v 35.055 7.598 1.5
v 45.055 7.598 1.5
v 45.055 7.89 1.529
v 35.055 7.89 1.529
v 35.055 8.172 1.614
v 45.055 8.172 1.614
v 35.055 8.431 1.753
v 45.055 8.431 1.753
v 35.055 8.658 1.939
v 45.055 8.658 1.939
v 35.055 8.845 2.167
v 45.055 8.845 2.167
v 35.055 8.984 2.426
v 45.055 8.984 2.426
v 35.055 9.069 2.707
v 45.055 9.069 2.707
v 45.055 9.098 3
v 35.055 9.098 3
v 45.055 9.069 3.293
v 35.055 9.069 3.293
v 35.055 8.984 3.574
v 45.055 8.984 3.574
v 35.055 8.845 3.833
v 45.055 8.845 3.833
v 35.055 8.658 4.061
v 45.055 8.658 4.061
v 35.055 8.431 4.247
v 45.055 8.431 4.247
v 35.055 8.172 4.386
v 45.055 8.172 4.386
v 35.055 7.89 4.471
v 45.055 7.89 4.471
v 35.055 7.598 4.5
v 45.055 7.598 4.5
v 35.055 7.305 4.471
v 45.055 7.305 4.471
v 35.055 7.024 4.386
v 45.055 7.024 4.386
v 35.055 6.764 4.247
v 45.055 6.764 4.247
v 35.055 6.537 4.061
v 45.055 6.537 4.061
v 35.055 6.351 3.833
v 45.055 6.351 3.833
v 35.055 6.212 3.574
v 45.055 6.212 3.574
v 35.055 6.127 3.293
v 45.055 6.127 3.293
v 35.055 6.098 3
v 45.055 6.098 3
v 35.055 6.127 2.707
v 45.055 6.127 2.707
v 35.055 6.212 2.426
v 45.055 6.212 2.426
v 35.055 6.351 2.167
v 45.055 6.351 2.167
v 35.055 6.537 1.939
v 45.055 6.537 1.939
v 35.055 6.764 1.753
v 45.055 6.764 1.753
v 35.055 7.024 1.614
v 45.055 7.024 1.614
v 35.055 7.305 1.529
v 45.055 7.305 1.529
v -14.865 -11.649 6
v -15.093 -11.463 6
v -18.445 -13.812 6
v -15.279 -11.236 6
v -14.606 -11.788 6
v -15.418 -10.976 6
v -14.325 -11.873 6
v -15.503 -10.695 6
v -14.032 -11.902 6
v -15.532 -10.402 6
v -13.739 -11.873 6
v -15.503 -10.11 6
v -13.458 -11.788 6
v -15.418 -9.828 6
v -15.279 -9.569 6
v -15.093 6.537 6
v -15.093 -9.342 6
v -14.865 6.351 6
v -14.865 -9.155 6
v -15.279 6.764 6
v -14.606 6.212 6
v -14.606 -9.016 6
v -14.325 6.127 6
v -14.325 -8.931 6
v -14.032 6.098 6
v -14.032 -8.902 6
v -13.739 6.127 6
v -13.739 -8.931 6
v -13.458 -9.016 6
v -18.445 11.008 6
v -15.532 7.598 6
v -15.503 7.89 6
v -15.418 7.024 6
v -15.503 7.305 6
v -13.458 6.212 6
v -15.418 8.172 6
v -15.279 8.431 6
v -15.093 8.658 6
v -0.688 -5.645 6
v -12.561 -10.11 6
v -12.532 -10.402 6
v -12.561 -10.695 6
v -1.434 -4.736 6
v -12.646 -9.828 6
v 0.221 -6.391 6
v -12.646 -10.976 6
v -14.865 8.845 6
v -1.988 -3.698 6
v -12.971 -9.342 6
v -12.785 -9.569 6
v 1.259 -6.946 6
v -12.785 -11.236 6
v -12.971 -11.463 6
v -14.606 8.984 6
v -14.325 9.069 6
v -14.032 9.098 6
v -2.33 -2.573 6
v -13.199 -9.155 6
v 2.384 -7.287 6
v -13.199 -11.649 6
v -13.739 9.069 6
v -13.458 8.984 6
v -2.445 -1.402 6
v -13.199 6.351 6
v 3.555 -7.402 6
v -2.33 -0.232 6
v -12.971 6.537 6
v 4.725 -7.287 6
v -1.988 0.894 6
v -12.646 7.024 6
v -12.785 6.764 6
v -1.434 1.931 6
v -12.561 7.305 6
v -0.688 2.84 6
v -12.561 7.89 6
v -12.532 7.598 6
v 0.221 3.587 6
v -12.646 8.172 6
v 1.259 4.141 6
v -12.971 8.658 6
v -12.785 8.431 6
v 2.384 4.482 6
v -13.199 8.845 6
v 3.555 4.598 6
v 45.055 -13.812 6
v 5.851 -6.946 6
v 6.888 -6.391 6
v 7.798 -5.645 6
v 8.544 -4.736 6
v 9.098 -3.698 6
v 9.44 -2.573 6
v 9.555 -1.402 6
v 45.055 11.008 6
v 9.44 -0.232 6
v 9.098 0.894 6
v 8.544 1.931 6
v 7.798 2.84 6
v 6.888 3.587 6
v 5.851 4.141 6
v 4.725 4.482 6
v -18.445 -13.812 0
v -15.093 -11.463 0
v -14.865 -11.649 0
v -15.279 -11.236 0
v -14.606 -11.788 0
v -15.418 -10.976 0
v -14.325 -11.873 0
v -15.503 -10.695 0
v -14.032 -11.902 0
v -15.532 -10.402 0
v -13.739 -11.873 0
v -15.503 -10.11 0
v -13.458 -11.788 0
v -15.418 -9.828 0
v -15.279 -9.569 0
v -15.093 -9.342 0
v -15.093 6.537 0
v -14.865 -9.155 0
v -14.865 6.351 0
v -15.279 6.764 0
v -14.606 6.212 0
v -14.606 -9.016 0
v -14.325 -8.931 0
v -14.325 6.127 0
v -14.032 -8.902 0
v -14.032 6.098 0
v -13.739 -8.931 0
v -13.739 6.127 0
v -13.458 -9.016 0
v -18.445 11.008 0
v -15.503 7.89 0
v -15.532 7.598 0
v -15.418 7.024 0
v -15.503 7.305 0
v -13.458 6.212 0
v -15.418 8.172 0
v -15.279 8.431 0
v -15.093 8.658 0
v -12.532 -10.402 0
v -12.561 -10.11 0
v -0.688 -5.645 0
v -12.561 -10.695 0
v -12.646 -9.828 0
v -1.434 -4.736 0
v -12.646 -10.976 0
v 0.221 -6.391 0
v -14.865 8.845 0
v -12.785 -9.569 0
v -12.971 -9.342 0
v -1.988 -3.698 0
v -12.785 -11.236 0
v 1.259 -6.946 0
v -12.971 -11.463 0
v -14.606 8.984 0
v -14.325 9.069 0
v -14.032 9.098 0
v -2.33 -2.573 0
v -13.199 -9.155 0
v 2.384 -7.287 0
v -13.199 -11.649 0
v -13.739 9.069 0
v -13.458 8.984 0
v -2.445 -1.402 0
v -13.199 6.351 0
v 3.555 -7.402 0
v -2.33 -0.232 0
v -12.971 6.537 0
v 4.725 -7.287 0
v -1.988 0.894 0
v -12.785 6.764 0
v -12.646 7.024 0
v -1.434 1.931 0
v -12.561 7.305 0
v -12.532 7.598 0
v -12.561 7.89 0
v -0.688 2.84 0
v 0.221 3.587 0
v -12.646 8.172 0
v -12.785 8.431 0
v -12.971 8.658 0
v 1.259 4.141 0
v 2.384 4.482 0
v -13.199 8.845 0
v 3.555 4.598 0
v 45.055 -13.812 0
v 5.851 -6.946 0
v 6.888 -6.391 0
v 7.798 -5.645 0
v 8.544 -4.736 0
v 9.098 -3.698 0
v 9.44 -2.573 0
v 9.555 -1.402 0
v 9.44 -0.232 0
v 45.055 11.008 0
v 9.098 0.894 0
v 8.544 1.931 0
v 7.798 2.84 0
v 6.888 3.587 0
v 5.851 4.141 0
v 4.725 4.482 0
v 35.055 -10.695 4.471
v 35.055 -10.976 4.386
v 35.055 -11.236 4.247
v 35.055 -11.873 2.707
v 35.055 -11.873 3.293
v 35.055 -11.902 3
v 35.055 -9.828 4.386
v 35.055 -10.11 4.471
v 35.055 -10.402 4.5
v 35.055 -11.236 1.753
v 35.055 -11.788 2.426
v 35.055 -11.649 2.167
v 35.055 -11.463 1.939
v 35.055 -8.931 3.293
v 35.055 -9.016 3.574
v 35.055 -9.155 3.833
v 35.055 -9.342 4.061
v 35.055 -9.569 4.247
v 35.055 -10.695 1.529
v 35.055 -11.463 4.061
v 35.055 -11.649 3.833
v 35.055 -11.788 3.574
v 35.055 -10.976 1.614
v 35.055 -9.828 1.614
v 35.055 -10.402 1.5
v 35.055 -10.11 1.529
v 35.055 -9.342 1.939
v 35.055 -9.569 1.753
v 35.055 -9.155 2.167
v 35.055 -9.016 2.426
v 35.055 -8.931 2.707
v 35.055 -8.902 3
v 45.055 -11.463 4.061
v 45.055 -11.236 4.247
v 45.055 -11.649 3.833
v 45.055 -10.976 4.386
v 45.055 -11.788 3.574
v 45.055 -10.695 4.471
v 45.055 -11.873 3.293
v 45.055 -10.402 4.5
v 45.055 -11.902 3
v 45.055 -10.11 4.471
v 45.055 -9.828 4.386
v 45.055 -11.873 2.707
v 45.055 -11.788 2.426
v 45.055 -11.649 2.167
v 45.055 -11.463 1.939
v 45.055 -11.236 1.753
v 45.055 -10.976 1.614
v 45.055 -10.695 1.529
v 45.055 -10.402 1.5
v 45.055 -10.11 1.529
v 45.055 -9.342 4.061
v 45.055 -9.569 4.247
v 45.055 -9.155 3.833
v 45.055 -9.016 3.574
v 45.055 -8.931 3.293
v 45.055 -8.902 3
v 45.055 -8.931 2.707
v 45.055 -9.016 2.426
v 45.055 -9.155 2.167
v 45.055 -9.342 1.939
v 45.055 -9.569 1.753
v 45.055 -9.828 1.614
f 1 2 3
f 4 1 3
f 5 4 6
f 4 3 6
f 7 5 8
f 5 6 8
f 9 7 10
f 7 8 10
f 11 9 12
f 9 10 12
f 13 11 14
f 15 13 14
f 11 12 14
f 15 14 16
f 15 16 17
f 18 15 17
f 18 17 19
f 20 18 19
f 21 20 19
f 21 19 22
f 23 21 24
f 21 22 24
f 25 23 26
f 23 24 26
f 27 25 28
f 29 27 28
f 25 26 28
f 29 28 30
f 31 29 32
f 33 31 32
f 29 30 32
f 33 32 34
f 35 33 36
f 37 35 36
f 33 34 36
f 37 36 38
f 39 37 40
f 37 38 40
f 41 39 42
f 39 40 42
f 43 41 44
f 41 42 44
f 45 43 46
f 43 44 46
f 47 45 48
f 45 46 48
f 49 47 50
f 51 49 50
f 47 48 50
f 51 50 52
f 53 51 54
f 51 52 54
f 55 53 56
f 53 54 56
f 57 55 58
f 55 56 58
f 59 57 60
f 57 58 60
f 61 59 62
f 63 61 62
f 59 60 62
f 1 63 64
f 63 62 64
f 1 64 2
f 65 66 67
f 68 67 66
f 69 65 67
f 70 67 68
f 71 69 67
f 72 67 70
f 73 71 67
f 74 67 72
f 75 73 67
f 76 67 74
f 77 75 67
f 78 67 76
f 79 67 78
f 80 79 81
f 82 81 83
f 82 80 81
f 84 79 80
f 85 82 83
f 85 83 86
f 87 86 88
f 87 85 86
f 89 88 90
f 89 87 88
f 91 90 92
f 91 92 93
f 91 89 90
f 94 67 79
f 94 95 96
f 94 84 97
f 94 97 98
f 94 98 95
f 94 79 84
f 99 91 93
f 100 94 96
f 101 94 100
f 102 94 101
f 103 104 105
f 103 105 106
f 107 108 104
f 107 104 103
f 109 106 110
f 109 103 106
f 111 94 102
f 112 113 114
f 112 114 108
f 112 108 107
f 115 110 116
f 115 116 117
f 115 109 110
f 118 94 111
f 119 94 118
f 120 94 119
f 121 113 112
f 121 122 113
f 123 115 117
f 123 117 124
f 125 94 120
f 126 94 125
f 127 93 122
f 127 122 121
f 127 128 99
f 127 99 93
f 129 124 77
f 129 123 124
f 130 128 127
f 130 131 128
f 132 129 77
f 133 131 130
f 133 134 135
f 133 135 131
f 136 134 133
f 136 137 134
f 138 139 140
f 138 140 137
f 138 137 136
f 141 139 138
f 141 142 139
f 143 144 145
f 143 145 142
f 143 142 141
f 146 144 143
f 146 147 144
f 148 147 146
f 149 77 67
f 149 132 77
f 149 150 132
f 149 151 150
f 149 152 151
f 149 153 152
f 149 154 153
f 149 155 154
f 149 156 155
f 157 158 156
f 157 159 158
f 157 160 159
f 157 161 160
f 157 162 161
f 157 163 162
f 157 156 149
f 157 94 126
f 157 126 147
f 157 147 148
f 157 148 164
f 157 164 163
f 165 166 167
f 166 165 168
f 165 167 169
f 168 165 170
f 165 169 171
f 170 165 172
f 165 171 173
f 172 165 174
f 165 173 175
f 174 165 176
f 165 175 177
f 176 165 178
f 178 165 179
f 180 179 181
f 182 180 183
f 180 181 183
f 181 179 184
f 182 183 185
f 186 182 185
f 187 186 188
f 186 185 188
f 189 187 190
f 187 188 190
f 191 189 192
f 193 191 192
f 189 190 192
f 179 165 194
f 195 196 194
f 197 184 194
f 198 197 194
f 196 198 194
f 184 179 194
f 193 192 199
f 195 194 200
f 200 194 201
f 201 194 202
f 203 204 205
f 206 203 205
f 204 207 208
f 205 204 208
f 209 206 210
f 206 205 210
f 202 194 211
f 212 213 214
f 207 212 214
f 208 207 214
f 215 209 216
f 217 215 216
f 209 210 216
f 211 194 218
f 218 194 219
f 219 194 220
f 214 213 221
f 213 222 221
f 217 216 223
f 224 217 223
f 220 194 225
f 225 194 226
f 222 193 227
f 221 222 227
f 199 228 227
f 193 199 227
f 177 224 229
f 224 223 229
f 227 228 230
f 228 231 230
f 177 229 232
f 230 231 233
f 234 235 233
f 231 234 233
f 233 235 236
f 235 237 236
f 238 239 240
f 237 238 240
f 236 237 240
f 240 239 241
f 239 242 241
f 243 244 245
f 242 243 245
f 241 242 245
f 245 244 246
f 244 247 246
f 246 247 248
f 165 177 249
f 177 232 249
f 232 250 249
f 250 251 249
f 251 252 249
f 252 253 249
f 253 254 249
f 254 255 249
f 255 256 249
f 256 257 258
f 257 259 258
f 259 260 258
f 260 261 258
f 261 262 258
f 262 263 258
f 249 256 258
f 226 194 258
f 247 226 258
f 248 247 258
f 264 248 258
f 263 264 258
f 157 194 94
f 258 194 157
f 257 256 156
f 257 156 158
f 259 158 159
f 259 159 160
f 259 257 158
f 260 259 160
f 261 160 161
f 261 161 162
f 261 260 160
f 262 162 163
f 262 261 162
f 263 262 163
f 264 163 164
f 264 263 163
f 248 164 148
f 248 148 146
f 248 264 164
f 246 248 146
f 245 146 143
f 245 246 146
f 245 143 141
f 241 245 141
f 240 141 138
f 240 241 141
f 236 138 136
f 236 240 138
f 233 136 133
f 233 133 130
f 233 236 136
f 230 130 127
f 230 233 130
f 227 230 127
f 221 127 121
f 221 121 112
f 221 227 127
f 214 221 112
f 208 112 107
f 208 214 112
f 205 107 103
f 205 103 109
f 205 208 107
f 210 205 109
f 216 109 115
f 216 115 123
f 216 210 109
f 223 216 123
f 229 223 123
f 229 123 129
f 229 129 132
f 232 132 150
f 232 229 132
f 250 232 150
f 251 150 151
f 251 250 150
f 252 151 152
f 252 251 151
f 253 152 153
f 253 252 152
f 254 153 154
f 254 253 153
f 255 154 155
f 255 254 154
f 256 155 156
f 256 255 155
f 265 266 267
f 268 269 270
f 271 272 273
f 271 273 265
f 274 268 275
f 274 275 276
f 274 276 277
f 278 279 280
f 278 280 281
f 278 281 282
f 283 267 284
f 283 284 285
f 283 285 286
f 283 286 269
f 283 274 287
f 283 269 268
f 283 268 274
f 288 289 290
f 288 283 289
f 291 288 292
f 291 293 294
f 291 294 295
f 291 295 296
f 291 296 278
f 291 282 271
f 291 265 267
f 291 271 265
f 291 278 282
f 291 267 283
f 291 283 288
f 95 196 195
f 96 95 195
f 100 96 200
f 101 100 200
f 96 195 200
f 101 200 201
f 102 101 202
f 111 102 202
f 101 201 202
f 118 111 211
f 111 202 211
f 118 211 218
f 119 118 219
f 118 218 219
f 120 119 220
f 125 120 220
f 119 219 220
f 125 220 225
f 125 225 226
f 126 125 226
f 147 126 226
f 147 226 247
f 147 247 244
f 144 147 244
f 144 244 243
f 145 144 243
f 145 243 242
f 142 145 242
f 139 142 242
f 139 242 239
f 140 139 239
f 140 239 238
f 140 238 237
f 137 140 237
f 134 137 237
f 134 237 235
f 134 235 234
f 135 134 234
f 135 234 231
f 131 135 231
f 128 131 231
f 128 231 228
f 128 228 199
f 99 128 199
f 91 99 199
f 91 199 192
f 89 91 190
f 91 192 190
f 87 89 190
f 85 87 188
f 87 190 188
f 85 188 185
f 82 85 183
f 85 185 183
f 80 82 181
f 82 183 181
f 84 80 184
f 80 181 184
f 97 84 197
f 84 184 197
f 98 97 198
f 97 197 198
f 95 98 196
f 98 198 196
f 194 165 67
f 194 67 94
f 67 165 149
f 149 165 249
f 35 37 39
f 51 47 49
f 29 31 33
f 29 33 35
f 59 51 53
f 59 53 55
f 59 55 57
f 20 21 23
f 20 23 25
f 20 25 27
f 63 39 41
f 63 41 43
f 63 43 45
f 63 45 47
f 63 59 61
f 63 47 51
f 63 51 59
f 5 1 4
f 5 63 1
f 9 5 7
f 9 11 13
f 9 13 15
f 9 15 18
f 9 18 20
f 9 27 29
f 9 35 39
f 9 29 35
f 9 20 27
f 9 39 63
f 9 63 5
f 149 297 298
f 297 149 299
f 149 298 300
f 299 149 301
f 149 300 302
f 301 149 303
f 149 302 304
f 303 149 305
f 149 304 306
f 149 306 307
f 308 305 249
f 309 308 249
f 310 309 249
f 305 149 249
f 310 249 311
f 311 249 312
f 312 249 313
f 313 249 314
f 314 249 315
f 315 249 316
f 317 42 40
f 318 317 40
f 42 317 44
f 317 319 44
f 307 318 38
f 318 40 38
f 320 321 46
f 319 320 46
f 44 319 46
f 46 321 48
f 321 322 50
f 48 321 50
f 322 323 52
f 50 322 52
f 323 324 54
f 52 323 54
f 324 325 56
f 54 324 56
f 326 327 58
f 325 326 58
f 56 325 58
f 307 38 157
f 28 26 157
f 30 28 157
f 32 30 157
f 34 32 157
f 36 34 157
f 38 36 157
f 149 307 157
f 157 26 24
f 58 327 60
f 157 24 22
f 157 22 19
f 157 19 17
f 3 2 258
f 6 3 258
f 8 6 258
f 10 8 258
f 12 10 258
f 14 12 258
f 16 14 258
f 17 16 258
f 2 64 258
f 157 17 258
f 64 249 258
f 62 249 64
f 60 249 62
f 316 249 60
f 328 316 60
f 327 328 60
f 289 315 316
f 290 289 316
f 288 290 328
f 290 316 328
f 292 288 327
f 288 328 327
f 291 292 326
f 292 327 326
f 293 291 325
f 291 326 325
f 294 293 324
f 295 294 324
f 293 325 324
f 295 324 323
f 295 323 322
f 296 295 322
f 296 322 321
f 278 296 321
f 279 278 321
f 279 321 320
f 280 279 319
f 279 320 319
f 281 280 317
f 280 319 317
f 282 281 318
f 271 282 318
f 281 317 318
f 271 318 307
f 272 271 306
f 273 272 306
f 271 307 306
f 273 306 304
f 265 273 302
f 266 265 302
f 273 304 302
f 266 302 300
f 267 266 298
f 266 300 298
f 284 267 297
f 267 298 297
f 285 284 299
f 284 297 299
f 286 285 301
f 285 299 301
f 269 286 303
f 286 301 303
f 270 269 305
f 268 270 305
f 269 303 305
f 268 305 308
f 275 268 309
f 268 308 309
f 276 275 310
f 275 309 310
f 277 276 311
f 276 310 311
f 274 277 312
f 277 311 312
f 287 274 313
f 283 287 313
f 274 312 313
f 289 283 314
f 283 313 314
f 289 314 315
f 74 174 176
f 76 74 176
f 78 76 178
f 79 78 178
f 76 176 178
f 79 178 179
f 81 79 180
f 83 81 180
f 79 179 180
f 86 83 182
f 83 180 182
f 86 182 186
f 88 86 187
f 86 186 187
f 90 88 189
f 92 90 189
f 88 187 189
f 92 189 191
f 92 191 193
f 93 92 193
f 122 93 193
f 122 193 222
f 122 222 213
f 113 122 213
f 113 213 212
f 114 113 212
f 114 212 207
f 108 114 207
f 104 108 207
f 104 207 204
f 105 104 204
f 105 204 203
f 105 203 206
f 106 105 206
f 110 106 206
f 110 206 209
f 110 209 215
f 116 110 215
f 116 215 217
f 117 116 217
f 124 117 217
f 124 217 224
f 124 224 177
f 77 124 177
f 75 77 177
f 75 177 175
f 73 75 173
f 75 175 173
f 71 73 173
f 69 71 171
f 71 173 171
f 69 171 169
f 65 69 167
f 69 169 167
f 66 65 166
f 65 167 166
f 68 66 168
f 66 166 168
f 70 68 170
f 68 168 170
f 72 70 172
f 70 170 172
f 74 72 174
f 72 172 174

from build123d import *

# Parameters (mm, degrees)
ESQUISSE1_W             = 63.5
ESQUISSE1_H             = 24.82
ESQUISSE1_R             = 6
BOSS_EXTRU_1_DEPTH      = 6
ESQUISSE2_R             = 1.5
ENL_V_MAT_EXTRU_1_DEPTH = 10
ESQUISSE3_R             = 1.5
ENL_V_MAT_EXTRU_2_DEPTH = 10


with BuildPart() as part:
    # Esquisse1 → Boss.-Extru.1 (new body)
    with BuildSketch(Plane.XY):
        with Locations((13.304900678, -1.402259887)):
            Rectangle(ESQUISSE1_W, ESQUISSE1_H)
        with Locations((3.554900678, -1.402259887)):
            Circle(ESQUISSE1_R, mode=Mode.SUBTRACT)
    extrude(amount=BOSS_EXTRU_1_DEPTH)

    # Esquisse2 → Enlèv. mat.-Extru.1 (cut)
    with BuildSketch(Plane(origin=(45.054900678, 0, 0), x_dir=(0, 0, -1), z_dir=(1, 0, 0))):
        with Locations((-3, 7.597740113)):
            Circle(ESQUISSE2_R)
        with Locations((-3, -10.402259887)):
            Circle(ESQUISSE2_R)
    extrude(amount=-ENL_V_MAT_EXTRU_1_DEPTH, mode=Mode.SUBTRACT)

    # Esquisse3 → Enlèv. mat.-Extru.2 (cut)
    with BuildSketch(Plane(origin=(0, 0, 0), x_dir=(-1, 0, 0), z_dir=(0, 0, -1))):
        with Locations((14.031893584, 7.597740113)):
            Circle(ESQUISSE3_R)
        with Locations((14.031893584, -10.402259887)):
            Circle(ESQUISSE3_R)
    extrude(amount=-ENL_V_MAT_EXTRU_2_DEPTH, mode=Mode.SUBTRACT)


solid = part.part
